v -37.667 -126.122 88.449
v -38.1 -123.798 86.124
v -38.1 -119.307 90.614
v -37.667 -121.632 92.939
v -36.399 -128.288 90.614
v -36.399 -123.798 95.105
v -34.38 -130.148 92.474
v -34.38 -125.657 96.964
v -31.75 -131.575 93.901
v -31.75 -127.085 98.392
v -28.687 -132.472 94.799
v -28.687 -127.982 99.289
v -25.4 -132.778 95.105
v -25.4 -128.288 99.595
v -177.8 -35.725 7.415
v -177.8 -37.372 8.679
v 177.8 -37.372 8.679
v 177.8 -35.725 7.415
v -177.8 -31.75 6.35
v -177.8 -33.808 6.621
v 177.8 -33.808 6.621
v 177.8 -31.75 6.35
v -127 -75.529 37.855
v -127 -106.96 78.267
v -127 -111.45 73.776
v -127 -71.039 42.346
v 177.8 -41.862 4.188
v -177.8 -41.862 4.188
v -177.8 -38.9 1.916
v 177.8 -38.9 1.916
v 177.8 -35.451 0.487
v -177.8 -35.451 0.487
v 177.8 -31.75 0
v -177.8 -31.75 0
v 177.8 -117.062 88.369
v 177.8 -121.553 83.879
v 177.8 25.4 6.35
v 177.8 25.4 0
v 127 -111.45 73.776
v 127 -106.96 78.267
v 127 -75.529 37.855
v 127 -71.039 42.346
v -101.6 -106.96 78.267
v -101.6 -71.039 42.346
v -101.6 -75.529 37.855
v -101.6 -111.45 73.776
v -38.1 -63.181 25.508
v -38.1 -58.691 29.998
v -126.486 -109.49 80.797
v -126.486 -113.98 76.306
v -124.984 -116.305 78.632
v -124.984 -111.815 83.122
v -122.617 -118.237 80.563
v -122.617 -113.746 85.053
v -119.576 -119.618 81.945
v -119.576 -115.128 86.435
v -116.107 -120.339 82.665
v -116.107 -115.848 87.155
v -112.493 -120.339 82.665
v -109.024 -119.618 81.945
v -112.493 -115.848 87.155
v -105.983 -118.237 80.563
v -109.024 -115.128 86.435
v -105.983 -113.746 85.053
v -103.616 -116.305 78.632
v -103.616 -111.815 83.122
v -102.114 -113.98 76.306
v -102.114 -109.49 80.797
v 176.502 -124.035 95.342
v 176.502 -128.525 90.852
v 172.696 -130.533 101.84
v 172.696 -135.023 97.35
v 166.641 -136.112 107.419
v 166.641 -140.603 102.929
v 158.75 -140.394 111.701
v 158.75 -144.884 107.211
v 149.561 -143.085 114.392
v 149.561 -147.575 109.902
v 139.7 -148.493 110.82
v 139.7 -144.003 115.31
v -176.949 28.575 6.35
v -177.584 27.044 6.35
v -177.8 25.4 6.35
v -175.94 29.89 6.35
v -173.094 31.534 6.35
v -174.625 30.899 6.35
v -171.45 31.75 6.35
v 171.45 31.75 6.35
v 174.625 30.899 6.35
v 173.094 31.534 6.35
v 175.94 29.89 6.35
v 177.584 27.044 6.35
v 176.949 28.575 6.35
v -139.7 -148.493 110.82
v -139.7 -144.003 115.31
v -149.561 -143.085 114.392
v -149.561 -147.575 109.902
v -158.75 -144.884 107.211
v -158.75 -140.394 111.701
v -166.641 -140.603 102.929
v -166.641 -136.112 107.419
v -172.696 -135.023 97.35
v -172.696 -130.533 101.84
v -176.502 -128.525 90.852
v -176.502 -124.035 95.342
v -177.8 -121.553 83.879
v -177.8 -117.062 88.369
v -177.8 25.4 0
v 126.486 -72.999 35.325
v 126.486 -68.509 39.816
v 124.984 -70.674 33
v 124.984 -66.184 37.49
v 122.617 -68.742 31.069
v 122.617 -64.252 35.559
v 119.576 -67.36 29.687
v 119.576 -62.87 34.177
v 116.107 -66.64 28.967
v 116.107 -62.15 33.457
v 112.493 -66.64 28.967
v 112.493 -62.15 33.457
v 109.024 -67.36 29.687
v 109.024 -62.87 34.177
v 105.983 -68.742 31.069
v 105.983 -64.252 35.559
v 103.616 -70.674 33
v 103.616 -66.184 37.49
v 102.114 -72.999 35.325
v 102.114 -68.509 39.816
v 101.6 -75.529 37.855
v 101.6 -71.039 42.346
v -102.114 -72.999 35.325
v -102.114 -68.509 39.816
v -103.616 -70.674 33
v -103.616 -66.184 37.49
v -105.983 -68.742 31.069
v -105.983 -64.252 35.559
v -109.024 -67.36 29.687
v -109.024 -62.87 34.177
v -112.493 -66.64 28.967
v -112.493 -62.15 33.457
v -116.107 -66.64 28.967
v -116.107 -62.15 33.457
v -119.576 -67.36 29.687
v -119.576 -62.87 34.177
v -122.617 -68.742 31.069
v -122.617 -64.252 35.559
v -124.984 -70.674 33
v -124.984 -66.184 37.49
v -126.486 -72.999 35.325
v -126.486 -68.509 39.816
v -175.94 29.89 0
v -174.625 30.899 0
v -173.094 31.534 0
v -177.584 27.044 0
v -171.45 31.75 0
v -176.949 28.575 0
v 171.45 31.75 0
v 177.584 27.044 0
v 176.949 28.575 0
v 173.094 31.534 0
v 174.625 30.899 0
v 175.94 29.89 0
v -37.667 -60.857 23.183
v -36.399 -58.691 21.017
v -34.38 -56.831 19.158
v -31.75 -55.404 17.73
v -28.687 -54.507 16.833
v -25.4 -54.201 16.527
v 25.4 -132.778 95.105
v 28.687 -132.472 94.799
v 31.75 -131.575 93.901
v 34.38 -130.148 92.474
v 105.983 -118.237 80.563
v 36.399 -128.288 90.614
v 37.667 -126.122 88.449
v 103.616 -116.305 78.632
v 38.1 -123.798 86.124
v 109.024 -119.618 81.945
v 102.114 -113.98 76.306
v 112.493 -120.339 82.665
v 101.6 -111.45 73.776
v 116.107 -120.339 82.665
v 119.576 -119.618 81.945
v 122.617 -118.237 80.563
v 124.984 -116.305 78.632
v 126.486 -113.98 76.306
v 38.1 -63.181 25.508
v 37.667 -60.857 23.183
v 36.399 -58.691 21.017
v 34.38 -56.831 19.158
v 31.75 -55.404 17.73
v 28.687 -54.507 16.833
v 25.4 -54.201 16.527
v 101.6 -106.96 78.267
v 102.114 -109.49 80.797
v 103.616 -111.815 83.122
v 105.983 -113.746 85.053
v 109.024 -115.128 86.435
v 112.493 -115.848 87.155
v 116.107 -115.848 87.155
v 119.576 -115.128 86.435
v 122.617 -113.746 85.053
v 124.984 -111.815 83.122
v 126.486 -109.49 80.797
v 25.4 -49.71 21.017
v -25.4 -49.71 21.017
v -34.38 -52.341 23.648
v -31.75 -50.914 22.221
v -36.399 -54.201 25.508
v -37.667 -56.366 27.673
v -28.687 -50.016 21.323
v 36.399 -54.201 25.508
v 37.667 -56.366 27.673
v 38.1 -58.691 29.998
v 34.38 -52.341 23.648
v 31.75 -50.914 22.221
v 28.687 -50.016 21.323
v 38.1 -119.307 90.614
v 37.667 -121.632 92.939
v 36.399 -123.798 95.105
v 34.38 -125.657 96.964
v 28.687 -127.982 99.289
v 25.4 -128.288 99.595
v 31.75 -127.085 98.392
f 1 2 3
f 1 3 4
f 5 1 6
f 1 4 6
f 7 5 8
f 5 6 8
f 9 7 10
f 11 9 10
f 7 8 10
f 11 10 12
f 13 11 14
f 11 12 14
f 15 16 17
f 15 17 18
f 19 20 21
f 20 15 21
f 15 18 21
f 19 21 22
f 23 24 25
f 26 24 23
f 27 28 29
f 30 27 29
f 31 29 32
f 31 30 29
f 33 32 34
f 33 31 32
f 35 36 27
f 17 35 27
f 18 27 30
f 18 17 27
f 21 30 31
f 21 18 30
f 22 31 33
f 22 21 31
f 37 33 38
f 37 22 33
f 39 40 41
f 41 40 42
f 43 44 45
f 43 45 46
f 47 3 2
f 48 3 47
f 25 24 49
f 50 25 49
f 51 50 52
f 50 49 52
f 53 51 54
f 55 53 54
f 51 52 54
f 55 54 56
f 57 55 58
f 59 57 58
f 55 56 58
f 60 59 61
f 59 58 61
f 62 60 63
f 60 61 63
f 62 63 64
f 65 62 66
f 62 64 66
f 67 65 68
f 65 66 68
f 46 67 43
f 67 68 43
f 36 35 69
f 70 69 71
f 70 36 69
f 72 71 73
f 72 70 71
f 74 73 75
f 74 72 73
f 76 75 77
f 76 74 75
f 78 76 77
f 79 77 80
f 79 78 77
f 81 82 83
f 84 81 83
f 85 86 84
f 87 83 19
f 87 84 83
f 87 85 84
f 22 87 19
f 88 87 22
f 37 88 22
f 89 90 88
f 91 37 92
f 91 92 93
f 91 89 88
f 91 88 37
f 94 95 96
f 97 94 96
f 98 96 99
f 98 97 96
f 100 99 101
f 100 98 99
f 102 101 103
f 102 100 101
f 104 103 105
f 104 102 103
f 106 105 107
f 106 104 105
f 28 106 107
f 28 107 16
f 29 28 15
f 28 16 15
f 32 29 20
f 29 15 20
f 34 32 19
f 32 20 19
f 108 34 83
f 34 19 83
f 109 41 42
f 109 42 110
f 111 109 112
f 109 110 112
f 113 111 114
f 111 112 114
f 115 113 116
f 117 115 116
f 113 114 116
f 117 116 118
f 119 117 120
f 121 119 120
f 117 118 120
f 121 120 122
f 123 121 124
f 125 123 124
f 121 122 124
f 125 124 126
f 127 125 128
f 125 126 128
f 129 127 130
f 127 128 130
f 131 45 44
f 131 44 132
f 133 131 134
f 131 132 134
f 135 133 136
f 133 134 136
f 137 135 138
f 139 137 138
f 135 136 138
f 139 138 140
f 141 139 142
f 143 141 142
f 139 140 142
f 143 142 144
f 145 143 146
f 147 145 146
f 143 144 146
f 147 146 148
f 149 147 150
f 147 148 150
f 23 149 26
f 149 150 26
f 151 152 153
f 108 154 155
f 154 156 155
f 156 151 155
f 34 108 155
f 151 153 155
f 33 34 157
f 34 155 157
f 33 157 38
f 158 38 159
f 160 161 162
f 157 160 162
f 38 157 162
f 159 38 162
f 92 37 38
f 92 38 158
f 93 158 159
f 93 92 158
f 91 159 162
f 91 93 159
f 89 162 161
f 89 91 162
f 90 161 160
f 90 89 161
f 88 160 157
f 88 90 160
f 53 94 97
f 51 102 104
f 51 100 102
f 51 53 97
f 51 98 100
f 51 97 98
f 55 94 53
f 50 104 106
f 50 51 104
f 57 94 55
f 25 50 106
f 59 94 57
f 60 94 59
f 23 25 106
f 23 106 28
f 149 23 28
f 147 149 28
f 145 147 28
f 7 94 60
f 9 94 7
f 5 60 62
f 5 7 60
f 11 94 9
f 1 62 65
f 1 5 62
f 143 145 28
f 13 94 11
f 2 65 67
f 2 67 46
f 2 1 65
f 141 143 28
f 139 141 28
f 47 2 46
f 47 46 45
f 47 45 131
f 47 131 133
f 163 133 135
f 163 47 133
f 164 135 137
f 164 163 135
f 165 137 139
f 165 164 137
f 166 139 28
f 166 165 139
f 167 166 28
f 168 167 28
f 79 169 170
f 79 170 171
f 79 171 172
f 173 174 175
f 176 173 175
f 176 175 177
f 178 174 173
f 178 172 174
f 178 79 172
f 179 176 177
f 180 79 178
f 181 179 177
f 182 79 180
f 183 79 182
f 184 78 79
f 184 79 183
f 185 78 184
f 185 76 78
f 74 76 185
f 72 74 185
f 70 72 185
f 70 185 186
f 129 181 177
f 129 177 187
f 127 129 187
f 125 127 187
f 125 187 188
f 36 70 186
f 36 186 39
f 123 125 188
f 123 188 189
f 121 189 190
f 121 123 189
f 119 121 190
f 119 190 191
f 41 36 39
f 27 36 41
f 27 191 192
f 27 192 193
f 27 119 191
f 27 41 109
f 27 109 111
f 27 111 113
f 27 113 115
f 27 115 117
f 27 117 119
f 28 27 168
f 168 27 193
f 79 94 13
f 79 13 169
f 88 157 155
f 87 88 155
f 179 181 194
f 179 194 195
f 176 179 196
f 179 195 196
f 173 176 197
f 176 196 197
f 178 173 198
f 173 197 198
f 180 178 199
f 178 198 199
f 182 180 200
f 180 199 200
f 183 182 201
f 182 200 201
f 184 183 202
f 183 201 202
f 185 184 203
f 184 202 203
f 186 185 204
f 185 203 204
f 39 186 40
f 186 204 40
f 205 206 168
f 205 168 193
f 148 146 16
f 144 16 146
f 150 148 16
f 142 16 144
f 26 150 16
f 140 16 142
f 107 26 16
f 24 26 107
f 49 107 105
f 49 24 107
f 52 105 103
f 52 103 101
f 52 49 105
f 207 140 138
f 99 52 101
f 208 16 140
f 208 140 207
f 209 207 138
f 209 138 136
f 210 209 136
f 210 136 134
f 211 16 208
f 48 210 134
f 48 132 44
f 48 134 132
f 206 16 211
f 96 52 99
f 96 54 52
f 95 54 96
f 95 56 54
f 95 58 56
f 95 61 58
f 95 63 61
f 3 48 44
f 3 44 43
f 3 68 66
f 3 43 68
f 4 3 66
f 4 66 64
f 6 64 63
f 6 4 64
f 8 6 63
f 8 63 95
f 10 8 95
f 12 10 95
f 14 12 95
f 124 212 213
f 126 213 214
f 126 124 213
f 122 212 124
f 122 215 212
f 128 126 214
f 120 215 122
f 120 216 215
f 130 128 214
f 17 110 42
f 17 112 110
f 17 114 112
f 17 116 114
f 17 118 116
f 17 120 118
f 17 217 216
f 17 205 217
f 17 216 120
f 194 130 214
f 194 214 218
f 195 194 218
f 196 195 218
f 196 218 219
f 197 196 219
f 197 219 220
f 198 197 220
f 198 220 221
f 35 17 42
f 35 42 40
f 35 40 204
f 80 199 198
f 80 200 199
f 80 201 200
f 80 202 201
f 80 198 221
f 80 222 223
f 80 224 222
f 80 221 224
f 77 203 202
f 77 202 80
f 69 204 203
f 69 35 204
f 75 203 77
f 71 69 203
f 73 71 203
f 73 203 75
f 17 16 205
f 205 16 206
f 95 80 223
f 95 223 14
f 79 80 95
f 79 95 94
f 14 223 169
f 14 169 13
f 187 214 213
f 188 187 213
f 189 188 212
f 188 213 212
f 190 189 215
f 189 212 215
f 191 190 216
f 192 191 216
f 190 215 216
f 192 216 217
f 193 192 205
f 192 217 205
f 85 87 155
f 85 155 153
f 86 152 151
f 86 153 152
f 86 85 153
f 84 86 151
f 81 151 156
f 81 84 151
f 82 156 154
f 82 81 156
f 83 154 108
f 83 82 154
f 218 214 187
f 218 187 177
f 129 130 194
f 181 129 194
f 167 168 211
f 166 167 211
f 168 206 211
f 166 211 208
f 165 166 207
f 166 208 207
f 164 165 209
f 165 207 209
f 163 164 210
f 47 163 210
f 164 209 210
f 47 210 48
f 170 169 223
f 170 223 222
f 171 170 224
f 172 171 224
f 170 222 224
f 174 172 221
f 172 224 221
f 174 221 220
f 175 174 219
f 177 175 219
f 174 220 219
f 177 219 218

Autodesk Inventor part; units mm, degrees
ref_plane "YZ Plane" through (0, 0, 0) normal (1, 0, 0) x (0, 1, 0)
ref_plane "XZ Plane" through (0, 0, 0) normal (0, 1, 0) x (-1, 0, 0)
ref_plane "XY Plane" through (0, 0, 0) normal (0, 0, 1) x (1, 0, 0)
sketch "Sketch1" plane through (0, 0, 0) normal (0, 0, 1) x (1, 0, 0)
  line L0 (-177.8, -31.75) -> (177.8, -31.75)
  line L1 (177.8, -31.75) -> (177.8, 31.75)
  line L2 (177.8, 31.75) -> (-177.8, 31.75)
  line L3 (-177.8, 31.75) -> (-177.8, -31.75)
  line L4 (-177.8, -31.75) -> (177.8, 31.75) construction
  line L5 (177.8, -31.75) -> (-177.8, 31.75) construction
  point P0 (0, 0)
  point P1 (0, 0)
  dimension "d31" = 355.6
  dimension "d32" = 63.5
extrude "Plate1" add sketch "Sketch1" along normal blind 6.35
sketch "Sketch3" plane through (177.8, -37.3716, 8.6786) normal (0, -0.7071068, -0.7071068) x (1, 0, 0)
  line L0 (-355.6, 0) -> (0, 0)
  line L1 (0, 0) -> (0, 150.7998)
  line L2 (0, 150.7998) -> (-355.6, 150.7998)
  line L3 (-355.6, 150.7998) -> (-355.6, 0)
edge flange "Flange2" height 165.1 angle 45 thickness 6.35 bend radius 7.9502 thickness toward (0, -0.7071068, -0.7071068) relief tear relief width 6.35 relief depth 3.175 edges at (0, -31.75, 6.35) wall of the first edge with corners at (-177.8, -37.3716, 8.6786) (177.8, -37.3716, 8.6786) (177.8, -144.0032, 115.3101) (-177.8, -144.0032, 115.3101)
bend "Bend2"
corner "Corner2"
fillet "Corner Round1" radius 6.35 2 edges at (177.8, 31.75, 3.175) (-177.8, 31.75, 3.175)
fillet "Corner Round2" radius 38.1 2 edges at (177.8, -146.2483, 113.0651) (-177.8, -146.2483, 113.0651)
sketch "Sketch4" plane through (-177.8, -37.3716, 8.6786) normal (0, 0.7071068, 0.7071068) x (1, 0, 0)
  line L0 (152.4, -17.4498) -> (203.2, -17.4498)
  line L1 (215.9, -30.1498) -> (215.9, -115.8748)
  line L2 (203.2, -128.5748) -> (152.4, -128.5748)
  line L3 (139.7, -115.8748) -> (139.7, -30.1498)
  line L4 (139.7, -17.4498) -> (215.9, -128.5748) construction
  line L5 (215.9, -17.4498) -> (139.7, -128.5748) construction
  line L6 (38.1, -150.7998) -> (317.5, -150.7998) construction
  arc A0 (152.4, -17.4498) -> (139.7, -30.1498) centre (152.4, -30.1498) ccw
  arc A1 (215.9, -30.1498) -> (203.2, -17.4498) centre (203.2, -30.1498) ccw
  arc A2 (203.2, -128.5748) -> (215.9, -115.8748) centre (203.2, -115.8748) ccw
  arc A3 (139.7, -115.8748) -> (152.4, -128.5748) centre (152.4, -115.8748) ccw
  line L7 (63.5, -98.4123) -> (63.5, -47.6123) construction
  line L8 (50.8, -98.4123) -> (50.8, -47.6123)
  line L9 (76.2, -47.6123) -> (76.2, -98.4123)
  arc A4 (50.8, -98.4123) -> (76.2, -98.4123) centre (63.5, -98.4123) ccw
  arc A5 (76.2, -47.6123) -> (50.8, -47.6123) centre (63.5, -47.6123) ccw
  line L10 (0, -112.6998) -> (0, 0) projected
  line L11 (177.8, -73.0123) -> (177.8, -150.7998) construction
  line L12 (292.1, -98.4123) -> (292.1, -47.6123) construction
  line L13 (304.8, -98.4123) -> (304.8, -47.6123)
  line L14 (279.4, -47.6123) -> (279.4, -98.4123)
  arc A6 (279.4, -98.4123) -> (304.8, -98.4123) centre (292.1, -98.4123) ccw
  arc A7 (304.8, -47.6123) -> (279.4, -47.6123) centre (292.1, -47.6123) ccw
  point P0 (63.5, -73.0123)
  dimension "d45" = 22.225
  dimension "d46" = 76.2
  dimension "d47" = 111.125
  dimension "d50" = 12.7
  dimension "d51" = 12.7
  dimension "d52" = 50.8
  dimension "d53" = 63.5
  dimension "d54" = 25.4
extrude "Cut1" cut sketch "Sketch4" against normal blind 6.35
equation "\"d48\" = Thickness"
equation "\"d15\" = Thickness"
equation "\"d33\" = BendReliefWidth"
equation "\"d34\" = BendReliefDepth"
equation "\"d35\" = MinimumRemnant"
equation "\"d36\" = TransitionRadius"
equation "\"d39\" = BendRadius"
equation "\"d40\" = CornerReliefSize"
equation "\"d41\" = GapSize"
equation "\"d42\" = JacobiRadiusSize"
equation "\"BendReliefWidth\" = Thickness"
equation "\"BendReliefDepth\" = 0.5 * Thickness"
equation "\"CornerReliefSize\" = 4 * Thickness"
equation "\"MinimumRemnant\" = 2 * Thickness"
equation "\"TransitionRadius\" = BendRadius"
equation "\"JacobiRadiusSize\" = Thickness"
equation "\"GapSize\" = Thickness"
equation "\"Thickness\" = 6.35"
equation "\"BendRadius\" = 7.9502"
properties part number "Model-4_Sheet Stifferner" material "SS304"
